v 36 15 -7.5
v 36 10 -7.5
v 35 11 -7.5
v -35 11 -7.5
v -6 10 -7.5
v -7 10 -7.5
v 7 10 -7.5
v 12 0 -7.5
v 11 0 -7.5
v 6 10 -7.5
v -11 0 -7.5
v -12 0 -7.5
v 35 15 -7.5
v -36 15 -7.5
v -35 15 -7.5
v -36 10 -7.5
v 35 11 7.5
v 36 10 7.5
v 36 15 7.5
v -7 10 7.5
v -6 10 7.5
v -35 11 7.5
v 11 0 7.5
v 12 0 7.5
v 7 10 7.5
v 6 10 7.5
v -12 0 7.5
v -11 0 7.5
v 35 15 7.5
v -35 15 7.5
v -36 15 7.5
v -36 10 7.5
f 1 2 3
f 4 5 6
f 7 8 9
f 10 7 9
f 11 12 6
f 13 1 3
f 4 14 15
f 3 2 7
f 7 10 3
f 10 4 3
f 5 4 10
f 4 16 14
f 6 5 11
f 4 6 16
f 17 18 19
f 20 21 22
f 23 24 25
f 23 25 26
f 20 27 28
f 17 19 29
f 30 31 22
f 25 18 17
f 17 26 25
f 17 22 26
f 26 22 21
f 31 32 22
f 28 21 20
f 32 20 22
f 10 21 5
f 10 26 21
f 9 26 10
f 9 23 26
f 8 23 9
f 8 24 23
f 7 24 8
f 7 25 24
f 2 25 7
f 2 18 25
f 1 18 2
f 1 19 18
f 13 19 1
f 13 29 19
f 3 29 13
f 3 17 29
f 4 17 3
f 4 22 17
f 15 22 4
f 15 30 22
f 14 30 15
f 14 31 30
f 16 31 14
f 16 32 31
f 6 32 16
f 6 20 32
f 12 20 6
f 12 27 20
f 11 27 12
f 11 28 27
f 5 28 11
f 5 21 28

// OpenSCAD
 linear_extrude(height = 15, center = true, convexity = 10, twist = 0)
  polygon( points=[ 
  [-11,0],
  [-12,0],
  [-7,10],
  [-36,10],
  [-36,15],
  
  [-35,15],
  [-35,11],
  [35,11],
  [35,15],
  [36,15],
  
  [36,10],
  [7,10],
  [12,0],
  [11,0],
  [6,10],
  
  [-6,10]],
  
  paths=[[0,1,2,3,4,5,6,7,8,9,10,11,12,13,14,15]],
  convexity=10);
  
  
